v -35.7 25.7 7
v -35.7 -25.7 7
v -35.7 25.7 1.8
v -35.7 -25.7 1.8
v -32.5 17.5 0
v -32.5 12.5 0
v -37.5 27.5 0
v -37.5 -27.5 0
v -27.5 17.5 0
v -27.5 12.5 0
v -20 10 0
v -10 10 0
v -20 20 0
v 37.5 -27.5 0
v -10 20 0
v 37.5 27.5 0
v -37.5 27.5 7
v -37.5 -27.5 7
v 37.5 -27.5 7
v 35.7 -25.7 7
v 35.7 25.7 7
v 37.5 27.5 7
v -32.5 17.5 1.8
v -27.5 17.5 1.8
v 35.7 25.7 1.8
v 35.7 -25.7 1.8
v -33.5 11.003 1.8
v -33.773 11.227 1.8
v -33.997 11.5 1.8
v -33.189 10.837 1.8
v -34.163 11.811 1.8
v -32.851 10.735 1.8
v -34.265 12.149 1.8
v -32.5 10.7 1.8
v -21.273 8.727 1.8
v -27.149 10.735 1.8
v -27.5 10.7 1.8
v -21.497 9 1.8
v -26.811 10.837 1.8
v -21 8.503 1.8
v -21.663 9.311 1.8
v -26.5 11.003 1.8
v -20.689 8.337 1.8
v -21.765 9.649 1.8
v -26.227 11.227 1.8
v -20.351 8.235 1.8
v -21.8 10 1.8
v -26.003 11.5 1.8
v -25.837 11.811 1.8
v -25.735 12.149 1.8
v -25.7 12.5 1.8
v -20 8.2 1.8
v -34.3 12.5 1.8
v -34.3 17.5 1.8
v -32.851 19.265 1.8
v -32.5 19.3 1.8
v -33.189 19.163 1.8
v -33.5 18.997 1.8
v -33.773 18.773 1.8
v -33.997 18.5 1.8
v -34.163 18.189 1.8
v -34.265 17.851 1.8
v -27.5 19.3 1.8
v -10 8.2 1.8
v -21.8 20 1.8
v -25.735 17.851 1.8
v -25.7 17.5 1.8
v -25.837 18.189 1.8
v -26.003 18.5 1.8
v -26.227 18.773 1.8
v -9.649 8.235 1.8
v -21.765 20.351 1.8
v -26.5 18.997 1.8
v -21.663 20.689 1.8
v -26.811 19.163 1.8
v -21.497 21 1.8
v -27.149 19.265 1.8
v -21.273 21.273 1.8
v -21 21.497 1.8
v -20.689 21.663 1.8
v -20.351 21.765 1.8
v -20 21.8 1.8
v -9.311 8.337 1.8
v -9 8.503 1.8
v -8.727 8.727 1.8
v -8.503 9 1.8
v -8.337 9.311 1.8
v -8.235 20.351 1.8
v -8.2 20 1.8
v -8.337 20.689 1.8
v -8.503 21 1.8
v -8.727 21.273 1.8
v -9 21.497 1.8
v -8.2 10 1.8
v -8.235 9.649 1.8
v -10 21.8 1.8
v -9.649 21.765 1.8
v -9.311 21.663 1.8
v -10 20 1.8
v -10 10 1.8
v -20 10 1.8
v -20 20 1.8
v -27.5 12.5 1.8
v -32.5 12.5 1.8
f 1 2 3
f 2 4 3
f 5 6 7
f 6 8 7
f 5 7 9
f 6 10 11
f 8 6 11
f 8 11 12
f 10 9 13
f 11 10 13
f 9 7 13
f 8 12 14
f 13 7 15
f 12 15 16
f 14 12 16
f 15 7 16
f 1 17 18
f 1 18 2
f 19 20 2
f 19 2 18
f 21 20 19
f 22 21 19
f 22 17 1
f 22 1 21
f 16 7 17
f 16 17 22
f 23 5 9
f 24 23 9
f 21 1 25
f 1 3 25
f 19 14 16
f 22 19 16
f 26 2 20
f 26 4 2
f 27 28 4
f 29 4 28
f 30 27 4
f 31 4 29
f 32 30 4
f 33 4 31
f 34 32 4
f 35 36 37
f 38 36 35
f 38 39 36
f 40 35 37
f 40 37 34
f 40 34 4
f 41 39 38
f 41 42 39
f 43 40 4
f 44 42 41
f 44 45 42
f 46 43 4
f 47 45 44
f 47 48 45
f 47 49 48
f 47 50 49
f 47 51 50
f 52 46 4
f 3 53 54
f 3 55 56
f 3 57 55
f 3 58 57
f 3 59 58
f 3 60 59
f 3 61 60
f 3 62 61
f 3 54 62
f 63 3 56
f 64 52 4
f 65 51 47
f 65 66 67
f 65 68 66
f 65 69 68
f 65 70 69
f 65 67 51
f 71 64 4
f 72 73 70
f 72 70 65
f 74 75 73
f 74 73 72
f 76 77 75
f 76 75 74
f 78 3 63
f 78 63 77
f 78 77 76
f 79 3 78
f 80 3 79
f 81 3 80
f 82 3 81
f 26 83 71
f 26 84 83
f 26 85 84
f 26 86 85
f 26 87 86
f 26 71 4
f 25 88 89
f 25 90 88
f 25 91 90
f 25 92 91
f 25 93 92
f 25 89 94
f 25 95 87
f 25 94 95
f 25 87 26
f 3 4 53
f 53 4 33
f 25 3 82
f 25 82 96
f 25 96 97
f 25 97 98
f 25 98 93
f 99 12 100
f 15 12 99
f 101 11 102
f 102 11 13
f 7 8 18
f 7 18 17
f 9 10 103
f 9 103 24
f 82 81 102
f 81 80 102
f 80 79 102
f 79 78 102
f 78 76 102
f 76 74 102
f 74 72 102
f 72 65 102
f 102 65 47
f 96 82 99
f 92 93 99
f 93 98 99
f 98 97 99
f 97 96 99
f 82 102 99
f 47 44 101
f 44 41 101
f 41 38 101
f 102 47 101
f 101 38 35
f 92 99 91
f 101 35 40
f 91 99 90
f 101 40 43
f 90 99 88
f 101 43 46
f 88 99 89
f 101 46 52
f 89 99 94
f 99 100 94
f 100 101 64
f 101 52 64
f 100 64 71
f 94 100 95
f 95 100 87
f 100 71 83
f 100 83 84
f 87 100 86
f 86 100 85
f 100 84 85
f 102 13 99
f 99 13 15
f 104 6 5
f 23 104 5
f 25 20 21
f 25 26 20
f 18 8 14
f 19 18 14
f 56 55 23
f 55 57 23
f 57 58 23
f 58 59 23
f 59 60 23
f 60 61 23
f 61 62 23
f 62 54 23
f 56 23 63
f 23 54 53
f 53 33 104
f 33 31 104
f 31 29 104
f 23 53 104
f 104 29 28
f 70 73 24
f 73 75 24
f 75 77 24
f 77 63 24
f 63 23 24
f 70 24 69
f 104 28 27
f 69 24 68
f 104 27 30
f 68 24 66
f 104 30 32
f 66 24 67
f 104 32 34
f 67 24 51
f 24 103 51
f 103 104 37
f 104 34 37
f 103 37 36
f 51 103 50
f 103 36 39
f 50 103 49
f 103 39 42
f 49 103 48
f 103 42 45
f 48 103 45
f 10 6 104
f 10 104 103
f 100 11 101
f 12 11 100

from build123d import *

# Parameters (mm, degrees)
F0_W     = 75
F0_H     = 55
F0_W_2   = 5
F0_H_2   = 5
F0_W_3   = 10
F0_H_3   = 10
F1_DEPTH = 7
F2_T     = -1.8
F3_W     = 35
F3_H     = 9.282675
F4_DEPTH = 25


with BuildPart() as f1:
    # F0 (on Top) → F1 (new body)
    with BuildSketch(Plane.XY):
        Rectangle(F0_W, F0_H)
        with Locations((-30, 15)):
            Rectangle(F0_W_2, F0_H_2, mode=Mode.SUBTRACT)
        with Locations((-15, 15)):
            Rectangle(F0_W_3, F0_H_3, mode=Mode.SUBTRACT)
    extrude(amount=F1_DEPTH)

    # F2
    f2_openings = [f1.faces().sort_by_distance(p)[0] for p in [
        (0.5625, -0.46875, 7),
    ]]
    offset(amount=F2_T, openings=f2_openings)

    # F3 (on Front) → F4 (cut)
    with BuildSketch(Plane.XZ):
        with Locations((-17.5, 6.441337)):
            Rectangle(F3_W, F3_H)
    extrude(amount=-F4_DEPTH, mode=Mode.SUBTRACT)


solid = f1.part
